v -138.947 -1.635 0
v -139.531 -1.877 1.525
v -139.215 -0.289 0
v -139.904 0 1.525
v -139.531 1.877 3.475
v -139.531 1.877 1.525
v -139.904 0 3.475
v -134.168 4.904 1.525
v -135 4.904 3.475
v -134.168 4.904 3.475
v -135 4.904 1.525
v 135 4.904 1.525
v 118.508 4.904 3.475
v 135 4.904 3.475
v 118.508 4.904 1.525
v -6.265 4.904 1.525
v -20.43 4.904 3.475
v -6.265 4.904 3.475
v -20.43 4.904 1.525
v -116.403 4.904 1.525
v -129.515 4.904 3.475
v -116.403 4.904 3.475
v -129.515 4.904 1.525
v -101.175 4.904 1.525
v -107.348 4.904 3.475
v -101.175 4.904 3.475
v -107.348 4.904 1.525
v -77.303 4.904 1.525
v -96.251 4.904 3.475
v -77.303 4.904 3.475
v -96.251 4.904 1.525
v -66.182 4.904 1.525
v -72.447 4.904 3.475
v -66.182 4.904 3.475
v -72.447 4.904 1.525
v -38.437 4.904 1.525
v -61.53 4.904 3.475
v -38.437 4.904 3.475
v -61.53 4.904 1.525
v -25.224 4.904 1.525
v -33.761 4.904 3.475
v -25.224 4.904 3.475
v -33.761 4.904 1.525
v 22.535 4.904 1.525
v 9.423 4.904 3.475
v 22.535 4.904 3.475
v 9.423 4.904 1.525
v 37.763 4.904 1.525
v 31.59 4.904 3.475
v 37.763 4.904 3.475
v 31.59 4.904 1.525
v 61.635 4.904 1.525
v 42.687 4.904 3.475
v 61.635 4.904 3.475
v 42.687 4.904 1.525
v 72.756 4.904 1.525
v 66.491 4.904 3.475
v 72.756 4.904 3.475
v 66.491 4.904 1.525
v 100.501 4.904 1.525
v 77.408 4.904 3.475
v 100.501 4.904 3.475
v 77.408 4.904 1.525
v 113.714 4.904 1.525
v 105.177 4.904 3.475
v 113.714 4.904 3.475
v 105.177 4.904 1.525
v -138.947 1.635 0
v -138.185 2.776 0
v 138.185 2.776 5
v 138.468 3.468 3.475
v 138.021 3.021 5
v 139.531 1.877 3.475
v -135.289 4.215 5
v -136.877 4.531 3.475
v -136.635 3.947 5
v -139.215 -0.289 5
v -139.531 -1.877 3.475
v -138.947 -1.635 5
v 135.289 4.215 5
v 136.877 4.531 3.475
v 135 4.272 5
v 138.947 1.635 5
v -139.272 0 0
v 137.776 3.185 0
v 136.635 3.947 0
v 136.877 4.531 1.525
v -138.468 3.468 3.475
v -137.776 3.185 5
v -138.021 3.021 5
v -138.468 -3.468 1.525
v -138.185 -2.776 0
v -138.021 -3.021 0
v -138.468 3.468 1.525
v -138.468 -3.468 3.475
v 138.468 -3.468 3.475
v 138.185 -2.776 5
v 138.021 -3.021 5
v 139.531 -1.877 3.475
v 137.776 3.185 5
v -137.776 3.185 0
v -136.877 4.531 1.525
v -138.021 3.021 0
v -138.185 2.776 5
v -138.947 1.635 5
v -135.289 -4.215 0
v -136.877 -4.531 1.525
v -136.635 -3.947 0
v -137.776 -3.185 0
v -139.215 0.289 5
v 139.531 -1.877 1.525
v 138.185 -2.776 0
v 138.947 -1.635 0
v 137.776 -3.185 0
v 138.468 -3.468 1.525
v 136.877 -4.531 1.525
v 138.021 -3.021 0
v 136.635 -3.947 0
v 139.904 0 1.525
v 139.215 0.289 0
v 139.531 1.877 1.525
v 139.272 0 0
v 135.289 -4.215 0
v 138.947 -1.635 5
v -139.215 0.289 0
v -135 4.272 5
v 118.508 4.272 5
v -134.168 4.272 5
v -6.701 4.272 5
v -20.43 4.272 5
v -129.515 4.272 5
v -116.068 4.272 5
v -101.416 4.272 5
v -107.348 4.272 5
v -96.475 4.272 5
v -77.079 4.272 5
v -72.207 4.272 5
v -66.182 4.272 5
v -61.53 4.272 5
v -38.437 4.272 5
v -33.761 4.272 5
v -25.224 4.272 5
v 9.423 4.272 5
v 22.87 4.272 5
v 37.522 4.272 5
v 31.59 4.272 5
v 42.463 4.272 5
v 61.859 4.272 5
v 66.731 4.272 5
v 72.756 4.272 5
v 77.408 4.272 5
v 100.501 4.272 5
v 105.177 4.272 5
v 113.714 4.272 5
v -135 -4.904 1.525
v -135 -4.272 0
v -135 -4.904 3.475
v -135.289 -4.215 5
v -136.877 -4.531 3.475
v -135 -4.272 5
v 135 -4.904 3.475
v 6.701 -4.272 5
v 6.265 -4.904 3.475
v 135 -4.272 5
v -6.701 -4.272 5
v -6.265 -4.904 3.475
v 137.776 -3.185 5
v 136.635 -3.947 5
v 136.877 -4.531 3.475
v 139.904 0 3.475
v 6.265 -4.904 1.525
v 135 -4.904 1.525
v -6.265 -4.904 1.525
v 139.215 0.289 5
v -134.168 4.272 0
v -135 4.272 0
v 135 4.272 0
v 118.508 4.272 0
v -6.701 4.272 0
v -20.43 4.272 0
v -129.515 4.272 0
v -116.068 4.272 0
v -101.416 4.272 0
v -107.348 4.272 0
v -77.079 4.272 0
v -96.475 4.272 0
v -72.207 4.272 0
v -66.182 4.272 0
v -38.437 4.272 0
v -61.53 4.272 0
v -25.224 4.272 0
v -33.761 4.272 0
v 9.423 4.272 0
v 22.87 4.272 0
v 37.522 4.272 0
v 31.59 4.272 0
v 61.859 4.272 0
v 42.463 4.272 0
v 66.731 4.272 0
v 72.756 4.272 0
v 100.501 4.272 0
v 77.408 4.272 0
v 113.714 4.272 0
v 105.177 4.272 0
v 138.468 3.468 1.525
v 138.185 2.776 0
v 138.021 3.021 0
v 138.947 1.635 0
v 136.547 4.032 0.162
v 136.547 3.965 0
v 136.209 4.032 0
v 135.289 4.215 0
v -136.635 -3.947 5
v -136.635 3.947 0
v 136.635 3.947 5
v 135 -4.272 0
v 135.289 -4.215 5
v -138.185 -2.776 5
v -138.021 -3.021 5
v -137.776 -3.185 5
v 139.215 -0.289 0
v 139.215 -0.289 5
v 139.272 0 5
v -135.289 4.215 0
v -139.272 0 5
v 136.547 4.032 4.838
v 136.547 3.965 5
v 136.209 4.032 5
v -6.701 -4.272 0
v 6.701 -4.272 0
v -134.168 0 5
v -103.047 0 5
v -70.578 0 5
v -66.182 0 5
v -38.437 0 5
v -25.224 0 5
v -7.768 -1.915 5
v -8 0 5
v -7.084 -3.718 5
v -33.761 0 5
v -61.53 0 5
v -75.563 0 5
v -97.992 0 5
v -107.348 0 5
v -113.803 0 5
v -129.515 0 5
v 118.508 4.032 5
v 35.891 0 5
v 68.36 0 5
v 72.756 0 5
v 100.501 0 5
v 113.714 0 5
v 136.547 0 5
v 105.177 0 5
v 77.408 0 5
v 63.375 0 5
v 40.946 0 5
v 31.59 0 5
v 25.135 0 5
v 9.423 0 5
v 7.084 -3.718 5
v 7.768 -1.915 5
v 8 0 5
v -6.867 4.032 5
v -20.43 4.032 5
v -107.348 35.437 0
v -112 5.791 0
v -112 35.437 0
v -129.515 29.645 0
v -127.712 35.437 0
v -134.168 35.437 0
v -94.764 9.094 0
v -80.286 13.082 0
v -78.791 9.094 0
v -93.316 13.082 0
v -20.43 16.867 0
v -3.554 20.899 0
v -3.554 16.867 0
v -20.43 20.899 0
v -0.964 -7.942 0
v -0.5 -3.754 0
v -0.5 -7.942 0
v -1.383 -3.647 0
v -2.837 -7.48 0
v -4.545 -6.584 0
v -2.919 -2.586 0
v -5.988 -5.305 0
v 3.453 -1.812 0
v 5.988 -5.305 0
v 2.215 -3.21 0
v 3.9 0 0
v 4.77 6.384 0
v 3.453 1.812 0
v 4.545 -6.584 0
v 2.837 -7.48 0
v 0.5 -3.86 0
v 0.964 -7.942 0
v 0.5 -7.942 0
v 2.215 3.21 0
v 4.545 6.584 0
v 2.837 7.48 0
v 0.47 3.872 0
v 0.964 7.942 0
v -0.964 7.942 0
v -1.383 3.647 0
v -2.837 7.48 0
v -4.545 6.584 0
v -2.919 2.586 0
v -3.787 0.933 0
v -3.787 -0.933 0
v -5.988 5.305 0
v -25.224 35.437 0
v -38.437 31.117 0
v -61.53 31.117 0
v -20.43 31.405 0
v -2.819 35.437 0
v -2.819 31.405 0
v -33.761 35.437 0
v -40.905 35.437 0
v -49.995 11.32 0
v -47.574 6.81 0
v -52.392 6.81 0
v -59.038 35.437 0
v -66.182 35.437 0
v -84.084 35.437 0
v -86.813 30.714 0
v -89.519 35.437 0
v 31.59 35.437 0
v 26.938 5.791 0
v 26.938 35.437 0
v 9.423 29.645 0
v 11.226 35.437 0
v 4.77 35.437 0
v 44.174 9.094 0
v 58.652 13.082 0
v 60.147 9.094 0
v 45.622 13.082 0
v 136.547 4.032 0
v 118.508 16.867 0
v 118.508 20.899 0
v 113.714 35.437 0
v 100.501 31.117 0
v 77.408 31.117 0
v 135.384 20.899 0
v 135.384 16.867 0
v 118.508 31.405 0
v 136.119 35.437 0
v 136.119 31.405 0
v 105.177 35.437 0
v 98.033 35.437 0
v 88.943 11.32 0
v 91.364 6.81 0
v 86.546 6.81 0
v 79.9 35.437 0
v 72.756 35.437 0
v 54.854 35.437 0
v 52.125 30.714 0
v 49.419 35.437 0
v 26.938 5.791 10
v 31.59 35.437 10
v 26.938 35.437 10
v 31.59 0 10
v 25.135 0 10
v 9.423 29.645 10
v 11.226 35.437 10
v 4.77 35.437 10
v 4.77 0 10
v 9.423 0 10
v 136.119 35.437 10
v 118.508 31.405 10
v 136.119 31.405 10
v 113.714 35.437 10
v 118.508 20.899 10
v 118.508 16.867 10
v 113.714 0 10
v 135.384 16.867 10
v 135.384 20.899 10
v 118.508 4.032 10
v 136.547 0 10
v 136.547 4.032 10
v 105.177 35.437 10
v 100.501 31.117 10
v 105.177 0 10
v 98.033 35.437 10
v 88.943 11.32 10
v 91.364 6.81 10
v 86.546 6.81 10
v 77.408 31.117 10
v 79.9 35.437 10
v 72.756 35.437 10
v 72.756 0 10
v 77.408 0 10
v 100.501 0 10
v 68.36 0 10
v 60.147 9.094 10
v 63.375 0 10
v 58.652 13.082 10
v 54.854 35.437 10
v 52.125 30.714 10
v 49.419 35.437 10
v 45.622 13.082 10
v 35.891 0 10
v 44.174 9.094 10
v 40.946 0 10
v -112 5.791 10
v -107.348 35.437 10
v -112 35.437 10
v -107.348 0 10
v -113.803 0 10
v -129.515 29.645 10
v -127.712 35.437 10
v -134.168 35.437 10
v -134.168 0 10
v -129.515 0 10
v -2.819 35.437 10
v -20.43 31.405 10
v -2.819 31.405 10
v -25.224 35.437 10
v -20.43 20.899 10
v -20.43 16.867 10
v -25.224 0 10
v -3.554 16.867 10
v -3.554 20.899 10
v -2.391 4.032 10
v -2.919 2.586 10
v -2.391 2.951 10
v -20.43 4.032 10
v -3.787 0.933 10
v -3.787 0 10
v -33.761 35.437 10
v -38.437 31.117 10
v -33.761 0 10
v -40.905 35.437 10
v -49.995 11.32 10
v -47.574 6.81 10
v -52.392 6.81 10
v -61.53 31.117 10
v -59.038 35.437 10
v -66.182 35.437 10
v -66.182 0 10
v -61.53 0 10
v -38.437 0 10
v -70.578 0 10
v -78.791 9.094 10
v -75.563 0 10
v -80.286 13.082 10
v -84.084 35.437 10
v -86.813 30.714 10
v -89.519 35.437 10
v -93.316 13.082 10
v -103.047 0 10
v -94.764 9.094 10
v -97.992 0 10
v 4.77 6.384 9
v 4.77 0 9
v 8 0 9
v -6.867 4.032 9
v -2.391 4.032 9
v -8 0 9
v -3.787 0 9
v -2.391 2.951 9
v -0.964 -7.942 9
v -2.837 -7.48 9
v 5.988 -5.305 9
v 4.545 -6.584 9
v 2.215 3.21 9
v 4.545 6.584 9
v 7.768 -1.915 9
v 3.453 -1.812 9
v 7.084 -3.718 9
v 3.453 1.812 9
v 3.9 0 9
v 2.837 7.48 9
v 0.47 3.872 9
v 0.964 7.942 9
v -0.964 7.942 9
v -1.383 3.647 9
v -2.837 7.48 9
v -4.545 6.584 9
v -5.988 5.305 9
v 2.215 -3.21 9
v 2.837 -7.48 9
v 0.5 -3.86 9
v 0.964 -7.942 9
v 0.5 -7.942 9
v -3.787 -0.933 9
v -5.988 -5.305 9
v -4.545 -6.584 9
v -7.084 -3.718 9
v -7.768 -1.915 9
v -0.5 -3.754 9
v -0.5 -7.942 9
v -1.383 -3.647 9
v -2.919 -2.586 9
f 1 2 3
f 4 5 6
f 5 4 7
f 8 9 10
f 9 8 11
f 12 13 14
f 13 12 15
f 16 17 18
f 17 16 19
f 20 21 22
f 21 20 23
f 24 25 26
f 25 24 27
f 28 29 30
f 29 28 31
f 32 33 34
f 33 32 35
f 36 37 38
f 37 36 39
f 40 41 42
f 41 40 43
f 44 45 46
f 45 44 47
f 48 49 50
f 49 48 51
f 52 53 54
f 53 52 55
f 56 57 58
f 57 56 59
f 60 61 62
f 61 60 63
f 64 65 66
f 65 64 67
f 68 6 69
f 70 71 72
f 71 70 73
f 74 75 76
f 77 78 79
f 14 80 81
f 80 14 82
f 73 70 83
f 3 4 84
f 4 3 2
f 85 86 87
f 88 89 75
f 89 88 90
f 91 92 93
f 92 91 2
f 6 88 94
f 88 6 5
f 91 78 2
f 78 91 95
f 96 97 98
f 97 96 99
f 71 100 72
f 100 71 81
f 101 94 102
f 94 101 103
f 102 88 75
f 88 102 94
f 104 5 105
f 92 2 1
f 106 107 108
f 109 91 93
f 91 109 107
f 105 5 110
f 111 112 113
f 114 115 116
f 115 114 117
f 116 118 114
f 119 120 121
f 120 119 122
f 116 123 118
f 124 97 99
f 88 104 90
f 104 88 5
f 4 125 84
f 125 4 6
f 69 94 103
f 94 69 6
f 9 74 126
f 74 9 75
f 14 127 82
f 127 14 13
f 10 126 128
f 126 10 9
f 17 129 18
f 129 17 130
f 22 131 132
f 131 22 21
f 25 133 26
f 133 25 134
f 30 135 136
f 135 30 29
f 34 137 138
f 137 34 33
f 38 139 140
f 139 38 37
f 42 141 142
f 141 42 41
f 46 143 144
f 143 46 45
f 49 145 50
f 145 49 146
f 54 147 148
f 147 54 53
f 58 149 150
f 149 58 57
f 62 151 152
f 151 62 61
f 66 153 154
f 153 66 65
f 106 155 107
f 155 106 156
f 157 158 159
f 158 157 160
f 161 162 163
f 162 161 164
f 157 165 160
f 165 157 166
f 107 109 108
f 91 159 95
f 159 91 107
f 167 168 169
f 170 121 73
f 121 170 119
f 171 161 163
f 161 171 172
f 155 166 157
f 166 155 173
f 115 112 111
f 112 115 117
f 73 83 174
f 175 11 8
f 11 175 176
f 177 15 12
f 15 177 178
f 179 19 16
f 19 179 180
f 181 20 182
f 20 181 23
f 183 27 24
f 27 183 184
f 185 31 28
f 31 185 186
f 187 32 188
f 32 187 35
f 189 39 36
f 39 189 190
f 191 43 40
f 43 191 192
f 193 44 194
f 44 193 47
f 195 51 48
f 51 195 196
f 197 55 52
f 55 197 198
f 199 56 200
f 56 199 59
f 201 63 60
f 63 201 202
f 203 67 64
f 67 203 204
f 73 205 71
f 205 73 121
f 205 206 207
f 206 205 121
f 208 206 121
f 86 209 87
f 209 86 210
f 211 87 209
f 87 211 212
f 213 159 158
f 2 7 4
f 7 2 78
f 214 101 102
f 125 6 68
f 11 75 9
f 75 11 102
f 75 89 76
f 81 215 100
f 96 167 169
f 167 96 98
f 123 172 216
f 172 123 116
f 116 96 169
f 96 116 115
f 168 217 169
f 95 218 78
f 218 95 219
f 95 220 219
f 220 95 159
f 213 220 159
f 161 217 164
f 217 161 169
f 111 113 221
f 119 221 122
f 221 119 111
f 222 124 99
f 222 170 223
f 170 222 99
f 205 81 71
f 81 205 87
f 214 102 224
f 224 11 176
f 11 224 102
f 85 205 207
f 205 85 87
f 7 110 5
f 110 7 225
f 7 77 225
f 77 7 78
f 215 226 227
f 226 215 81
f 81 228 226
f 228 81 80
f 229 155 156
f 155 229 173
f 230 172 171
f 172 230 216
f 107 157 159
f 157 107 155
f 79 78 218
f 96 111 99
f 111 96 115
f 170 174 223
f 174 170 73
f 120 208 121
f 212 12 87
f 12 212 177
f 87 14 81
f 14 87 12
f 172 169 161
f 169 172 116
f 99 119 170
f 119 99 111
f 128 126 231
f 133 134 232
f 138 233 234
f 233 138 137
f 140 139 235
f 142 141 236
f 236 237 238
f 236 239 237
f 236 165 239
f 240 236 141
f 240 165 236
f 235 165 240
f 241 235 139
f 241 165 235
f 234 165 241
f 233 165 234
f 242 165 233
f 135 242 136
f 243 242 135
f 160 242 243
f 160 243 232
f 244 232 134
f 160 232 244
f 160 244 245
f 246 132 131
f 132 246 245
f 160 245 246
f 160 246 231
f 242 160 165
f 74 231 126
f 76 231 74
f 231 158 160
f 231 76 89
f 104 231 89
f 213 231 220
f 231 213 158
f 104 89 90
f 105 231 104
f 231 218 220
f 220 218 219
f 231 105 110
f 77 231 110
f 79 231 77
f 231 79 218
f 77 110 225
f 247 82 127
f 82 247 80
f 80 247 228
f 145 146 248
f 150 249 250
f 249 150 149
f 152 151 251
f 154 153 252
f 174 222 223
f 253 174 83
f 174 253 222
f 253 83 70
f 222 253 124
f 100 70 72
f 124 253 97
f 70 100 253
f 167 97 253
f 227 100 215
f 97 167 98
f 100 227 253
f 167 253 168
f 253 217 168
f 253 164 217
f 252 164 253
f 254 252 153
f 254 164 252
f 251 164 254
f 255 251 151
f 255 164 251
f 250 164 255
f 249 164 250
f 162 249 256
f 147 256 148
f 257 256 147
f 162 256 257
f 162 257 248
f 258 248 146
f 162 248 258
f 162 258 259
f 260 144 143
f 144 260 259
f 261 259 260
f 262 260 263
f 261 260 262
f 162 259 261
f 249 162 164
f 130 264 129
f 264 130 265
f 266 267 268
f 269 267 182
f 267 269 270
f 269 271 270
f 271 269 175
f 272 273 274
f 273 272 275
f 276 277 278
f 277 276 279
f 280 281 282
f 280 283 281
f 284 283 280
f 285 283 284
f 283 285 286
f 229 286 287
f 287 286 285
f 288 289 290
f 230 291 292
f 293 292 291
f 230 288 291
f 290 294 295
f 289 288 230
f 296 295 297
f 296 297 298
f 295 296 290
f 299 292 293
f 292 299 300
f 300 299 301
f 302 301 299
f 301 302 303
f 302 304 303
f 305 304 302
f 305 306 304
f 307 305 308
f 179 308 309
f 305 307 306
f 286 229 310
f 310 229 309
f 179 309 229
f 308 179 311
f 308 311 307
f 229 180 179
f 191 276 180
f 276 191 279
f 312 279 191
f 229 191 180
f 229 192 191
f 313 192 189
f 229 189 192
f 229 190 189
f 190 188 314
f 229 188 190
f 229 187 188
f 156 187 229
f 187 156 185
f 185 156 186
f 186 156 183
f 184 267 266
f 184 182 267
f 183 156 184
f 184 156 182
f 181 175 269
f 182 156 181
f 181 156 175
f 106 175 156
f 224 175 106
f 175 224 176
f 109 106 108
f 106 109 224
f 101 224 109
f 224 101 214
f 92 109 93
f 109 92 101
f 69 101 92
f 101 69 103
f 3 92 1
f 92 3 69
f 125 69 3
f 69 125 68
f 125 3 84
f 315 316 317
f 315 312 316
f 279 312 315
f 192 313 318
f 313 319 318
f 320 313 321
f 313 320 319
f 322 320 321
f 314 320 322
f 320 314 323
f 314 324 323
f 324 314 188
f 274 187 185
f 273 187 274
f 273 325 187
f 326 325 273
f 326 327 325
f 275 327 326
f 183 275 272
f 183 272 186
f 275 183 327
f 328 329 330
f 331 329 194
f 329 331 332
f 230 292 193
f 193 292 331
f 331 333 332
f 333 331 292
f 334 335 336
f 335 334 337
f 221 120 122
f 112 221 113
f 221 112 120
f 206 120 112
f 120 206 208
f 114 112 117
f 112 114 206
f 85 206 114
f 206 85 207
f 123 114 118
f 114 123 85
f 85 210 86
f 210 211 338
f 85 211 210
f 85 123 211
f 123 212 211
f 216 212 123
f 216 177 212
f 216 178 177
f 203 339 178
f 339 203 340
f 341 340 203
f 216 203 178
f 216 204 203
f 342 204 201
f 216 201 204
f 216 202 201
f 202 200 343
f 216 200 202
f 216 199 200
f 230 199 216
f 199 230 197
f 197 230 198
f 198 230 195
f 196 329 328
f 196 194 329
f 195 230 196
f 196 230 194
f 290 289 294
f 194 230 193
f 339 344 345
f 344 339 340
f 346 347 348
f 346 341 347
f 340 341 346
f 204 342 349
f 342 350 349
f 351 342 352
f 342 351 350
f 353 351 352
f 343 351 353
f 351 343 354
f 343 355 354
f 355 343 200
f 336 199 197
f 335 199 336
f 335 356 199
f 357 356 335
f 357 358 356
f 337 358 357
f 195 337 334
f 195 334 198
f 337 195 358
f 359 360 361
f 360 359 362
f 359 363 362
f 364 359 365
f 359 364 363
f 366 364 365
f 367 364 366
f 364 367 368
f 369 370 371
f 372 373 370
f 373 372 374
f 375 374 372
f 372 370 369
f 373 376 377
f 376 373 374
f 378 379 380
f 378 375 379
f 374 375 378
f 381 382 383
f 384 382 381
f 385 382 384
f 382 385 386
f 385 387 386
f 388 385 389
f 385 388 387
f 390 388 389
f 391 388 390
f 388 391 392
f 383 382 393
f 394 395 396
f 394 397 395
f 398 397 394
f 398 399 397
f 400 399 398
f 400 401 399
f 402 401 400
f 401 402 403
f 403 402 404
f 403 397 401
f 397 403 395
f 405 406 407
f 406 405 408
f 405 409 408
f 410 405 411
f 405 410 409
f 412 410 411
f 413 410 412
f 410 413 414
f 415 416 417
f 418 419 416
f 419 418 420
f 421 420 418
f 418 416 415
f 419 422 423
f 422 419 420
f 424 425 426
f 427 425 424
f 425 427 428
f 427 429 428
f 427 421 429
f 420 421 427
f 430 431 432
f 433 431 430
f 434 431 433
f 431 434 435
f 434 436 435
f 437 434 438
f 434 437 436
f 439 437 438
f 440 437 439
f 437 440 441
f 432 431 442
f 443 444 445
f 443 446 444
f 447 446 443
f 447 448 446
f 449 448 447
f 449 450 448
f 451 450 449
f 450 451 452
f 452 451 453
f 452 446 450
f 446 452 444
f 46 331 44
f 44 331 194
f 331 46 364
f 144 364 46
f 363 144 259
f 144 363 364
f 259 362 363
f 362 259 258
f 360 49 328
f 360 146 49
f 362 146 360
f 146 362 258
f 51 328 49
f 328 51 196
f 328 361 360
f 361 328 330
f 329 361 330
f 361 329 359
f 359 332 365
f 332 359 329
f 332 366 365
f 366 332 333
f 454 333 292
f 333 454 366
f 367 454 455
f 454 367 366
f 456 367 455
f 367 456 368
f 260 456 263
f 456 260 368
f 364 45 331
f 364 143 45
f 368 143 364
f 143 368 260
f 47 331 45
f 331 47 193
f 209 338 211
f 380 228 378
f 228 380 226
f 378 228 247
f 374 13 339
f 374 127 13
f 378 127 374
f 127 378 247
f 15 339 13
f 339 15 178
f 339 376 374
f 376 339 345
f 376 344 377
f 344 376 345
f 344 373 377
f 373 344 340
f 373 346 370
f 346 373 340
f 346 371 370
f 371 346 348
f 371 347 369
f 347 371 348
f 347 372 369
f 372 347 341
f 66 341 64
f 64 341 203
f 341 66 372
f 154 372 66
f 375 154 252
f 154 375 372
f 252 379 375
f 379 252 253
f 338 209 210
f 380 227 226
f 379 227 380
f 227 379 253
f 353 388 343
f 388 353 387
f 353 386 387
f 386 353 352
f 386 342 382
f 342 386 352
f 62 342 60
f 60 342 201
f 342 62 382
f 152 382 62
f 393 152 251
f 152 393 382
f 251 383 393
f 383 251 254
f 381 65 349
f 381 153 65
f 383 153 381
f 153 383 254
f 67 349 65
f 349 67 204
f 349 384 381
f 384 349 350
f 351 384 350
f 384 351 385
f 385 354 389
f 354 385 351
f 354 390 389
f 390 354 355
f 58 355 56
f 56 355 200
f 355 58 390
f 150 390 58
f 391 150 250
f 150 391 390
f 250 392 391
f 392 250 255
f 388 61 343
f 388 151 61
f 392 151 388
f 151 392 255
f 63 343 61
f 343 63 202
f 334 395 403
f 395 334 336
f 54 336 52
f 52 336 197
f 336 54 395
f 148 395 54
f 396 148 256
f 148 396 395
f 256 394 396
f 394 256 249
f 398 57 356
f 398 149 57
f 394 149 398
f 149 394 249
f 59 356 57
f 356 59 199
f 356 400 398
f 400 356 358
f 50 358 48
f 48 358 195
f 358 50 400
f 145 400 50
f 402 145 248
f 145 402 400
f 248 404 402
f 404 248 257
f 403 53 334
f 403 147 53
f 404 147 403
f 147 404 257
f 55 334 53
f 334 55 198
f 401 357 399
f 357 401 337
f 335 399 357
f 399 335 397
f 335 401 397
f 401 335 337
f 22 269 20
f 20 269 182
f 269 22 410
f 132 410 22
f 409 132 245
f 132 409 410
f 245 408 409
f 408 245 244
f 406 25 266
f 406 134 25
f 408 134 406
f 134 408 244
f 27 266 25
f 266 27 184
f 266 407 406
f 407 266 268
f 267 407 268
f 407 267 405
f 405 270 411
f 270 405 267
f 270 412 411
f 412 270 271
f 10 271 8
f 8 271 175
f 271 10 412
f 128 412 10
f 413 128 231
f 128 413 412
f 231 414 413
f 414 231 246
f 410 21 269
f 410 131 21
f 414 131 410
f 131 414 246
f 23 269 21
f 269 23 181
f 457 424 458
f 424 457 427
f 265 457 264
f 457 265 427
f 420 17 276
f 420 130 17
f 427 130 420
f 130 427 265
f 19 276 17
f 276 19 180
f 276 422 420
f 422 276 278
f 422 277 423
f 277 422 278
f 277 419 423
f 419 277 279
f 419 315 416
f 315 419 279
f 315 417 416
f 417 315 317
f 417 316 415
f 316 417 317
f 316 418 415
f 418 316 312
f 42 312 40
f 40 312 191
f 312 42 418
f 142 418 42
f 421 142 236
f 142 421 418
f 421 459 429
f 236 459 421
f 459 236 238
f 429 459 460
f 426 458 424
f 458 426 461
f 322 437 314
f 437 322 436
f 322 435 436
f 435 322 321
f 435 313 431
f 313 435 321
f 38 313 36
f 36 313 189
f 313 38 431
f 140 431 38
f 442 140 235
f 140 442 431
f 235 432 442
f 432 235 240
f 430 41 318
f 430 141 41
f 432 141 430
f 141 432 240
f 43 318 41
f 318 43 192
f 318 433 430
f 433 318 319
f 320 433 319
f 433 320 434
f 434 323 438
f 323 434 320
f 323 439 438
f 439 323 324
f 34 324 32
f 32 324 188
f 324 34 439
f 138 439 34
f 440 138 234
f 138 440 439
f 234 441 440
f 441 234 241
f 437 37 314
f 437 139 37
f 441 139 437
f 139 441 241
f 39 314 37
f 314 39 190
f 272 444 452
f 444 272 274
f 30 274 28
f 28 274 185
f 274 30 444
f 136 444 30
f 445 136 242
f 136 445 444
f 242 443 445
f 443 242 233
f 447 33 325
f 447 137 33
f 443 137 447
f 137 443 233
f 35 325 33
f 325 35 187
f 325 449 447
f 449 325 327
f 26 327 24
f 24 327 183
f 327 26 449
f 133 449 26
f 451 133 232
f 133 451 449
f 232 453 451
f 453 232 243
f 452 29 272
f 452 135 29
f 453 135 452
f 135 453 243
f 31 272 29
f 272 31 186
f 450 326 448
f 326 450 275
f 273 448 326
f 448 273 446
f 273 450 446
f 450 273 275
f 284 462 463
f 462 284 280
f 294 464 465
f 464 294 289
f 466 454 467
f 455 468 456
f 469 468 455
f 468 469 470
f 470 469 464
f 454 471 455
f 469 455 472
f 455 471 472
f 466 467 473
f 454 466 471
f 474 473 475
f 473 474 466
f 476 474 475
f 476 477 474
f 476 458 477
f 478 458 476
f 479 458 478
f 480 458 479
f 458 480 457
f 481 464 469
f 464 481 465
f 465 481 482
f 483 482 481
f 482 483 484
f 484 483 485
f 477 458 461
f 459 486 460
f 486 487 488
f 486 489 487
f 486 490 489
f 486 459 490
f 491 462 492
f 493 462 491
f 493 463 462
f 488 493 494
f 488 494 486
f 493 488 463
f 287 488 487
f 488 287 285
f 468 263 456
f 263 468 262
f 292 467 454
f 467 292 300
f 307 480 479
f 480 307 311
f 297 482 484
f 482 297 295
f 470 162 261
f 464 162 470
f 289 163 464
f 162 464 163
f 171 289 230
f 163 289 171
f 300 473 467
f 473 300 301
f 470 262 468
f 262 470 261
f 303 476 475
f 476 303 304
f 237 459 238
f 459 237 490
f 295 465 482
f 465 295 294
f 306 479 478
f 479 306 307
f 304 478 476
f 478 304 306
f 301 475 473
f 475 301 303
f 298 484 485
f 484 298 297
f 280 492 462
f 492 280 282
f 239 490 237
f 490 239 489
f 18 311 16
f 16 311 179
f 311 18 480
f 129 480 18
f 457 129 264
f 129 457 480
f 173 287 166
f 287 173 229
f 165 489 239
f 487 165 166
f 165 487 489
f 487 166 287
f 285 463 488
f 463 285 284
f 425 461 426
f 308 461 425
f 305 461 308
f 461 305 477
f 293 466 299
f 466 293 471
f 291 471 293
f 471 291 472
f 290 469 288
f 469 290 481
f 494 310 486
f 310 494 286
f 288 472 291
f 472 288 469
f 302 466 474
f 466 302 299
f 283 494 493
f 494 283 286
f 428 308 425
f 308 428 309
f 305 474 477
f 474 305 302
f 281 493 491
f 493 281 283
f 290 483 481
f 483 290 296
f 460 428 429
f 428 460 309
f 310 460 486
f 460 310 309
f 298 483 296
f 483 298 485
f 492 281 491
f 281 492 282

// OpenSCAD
difference(){
	union(){
		linear_extrude(10)text("NAMENAME",35,"Tsukushi A Round Gothic Bold",halign="center");
		translate([0,0,5/2])intersection(){
			hull(){
				translate([135,0,0])sphere(d=10);
				translate([-135,0,0])sphere(d=10);
			}
			cube([500,10,5],center=true);
		}
		cylinder(d=16,h=9);
	}
	translate([0,0,-1])cylinder(d=7.8,h=15);
	rotate(180)translate([-.5,0,0])cube([1,20,20]);
}
